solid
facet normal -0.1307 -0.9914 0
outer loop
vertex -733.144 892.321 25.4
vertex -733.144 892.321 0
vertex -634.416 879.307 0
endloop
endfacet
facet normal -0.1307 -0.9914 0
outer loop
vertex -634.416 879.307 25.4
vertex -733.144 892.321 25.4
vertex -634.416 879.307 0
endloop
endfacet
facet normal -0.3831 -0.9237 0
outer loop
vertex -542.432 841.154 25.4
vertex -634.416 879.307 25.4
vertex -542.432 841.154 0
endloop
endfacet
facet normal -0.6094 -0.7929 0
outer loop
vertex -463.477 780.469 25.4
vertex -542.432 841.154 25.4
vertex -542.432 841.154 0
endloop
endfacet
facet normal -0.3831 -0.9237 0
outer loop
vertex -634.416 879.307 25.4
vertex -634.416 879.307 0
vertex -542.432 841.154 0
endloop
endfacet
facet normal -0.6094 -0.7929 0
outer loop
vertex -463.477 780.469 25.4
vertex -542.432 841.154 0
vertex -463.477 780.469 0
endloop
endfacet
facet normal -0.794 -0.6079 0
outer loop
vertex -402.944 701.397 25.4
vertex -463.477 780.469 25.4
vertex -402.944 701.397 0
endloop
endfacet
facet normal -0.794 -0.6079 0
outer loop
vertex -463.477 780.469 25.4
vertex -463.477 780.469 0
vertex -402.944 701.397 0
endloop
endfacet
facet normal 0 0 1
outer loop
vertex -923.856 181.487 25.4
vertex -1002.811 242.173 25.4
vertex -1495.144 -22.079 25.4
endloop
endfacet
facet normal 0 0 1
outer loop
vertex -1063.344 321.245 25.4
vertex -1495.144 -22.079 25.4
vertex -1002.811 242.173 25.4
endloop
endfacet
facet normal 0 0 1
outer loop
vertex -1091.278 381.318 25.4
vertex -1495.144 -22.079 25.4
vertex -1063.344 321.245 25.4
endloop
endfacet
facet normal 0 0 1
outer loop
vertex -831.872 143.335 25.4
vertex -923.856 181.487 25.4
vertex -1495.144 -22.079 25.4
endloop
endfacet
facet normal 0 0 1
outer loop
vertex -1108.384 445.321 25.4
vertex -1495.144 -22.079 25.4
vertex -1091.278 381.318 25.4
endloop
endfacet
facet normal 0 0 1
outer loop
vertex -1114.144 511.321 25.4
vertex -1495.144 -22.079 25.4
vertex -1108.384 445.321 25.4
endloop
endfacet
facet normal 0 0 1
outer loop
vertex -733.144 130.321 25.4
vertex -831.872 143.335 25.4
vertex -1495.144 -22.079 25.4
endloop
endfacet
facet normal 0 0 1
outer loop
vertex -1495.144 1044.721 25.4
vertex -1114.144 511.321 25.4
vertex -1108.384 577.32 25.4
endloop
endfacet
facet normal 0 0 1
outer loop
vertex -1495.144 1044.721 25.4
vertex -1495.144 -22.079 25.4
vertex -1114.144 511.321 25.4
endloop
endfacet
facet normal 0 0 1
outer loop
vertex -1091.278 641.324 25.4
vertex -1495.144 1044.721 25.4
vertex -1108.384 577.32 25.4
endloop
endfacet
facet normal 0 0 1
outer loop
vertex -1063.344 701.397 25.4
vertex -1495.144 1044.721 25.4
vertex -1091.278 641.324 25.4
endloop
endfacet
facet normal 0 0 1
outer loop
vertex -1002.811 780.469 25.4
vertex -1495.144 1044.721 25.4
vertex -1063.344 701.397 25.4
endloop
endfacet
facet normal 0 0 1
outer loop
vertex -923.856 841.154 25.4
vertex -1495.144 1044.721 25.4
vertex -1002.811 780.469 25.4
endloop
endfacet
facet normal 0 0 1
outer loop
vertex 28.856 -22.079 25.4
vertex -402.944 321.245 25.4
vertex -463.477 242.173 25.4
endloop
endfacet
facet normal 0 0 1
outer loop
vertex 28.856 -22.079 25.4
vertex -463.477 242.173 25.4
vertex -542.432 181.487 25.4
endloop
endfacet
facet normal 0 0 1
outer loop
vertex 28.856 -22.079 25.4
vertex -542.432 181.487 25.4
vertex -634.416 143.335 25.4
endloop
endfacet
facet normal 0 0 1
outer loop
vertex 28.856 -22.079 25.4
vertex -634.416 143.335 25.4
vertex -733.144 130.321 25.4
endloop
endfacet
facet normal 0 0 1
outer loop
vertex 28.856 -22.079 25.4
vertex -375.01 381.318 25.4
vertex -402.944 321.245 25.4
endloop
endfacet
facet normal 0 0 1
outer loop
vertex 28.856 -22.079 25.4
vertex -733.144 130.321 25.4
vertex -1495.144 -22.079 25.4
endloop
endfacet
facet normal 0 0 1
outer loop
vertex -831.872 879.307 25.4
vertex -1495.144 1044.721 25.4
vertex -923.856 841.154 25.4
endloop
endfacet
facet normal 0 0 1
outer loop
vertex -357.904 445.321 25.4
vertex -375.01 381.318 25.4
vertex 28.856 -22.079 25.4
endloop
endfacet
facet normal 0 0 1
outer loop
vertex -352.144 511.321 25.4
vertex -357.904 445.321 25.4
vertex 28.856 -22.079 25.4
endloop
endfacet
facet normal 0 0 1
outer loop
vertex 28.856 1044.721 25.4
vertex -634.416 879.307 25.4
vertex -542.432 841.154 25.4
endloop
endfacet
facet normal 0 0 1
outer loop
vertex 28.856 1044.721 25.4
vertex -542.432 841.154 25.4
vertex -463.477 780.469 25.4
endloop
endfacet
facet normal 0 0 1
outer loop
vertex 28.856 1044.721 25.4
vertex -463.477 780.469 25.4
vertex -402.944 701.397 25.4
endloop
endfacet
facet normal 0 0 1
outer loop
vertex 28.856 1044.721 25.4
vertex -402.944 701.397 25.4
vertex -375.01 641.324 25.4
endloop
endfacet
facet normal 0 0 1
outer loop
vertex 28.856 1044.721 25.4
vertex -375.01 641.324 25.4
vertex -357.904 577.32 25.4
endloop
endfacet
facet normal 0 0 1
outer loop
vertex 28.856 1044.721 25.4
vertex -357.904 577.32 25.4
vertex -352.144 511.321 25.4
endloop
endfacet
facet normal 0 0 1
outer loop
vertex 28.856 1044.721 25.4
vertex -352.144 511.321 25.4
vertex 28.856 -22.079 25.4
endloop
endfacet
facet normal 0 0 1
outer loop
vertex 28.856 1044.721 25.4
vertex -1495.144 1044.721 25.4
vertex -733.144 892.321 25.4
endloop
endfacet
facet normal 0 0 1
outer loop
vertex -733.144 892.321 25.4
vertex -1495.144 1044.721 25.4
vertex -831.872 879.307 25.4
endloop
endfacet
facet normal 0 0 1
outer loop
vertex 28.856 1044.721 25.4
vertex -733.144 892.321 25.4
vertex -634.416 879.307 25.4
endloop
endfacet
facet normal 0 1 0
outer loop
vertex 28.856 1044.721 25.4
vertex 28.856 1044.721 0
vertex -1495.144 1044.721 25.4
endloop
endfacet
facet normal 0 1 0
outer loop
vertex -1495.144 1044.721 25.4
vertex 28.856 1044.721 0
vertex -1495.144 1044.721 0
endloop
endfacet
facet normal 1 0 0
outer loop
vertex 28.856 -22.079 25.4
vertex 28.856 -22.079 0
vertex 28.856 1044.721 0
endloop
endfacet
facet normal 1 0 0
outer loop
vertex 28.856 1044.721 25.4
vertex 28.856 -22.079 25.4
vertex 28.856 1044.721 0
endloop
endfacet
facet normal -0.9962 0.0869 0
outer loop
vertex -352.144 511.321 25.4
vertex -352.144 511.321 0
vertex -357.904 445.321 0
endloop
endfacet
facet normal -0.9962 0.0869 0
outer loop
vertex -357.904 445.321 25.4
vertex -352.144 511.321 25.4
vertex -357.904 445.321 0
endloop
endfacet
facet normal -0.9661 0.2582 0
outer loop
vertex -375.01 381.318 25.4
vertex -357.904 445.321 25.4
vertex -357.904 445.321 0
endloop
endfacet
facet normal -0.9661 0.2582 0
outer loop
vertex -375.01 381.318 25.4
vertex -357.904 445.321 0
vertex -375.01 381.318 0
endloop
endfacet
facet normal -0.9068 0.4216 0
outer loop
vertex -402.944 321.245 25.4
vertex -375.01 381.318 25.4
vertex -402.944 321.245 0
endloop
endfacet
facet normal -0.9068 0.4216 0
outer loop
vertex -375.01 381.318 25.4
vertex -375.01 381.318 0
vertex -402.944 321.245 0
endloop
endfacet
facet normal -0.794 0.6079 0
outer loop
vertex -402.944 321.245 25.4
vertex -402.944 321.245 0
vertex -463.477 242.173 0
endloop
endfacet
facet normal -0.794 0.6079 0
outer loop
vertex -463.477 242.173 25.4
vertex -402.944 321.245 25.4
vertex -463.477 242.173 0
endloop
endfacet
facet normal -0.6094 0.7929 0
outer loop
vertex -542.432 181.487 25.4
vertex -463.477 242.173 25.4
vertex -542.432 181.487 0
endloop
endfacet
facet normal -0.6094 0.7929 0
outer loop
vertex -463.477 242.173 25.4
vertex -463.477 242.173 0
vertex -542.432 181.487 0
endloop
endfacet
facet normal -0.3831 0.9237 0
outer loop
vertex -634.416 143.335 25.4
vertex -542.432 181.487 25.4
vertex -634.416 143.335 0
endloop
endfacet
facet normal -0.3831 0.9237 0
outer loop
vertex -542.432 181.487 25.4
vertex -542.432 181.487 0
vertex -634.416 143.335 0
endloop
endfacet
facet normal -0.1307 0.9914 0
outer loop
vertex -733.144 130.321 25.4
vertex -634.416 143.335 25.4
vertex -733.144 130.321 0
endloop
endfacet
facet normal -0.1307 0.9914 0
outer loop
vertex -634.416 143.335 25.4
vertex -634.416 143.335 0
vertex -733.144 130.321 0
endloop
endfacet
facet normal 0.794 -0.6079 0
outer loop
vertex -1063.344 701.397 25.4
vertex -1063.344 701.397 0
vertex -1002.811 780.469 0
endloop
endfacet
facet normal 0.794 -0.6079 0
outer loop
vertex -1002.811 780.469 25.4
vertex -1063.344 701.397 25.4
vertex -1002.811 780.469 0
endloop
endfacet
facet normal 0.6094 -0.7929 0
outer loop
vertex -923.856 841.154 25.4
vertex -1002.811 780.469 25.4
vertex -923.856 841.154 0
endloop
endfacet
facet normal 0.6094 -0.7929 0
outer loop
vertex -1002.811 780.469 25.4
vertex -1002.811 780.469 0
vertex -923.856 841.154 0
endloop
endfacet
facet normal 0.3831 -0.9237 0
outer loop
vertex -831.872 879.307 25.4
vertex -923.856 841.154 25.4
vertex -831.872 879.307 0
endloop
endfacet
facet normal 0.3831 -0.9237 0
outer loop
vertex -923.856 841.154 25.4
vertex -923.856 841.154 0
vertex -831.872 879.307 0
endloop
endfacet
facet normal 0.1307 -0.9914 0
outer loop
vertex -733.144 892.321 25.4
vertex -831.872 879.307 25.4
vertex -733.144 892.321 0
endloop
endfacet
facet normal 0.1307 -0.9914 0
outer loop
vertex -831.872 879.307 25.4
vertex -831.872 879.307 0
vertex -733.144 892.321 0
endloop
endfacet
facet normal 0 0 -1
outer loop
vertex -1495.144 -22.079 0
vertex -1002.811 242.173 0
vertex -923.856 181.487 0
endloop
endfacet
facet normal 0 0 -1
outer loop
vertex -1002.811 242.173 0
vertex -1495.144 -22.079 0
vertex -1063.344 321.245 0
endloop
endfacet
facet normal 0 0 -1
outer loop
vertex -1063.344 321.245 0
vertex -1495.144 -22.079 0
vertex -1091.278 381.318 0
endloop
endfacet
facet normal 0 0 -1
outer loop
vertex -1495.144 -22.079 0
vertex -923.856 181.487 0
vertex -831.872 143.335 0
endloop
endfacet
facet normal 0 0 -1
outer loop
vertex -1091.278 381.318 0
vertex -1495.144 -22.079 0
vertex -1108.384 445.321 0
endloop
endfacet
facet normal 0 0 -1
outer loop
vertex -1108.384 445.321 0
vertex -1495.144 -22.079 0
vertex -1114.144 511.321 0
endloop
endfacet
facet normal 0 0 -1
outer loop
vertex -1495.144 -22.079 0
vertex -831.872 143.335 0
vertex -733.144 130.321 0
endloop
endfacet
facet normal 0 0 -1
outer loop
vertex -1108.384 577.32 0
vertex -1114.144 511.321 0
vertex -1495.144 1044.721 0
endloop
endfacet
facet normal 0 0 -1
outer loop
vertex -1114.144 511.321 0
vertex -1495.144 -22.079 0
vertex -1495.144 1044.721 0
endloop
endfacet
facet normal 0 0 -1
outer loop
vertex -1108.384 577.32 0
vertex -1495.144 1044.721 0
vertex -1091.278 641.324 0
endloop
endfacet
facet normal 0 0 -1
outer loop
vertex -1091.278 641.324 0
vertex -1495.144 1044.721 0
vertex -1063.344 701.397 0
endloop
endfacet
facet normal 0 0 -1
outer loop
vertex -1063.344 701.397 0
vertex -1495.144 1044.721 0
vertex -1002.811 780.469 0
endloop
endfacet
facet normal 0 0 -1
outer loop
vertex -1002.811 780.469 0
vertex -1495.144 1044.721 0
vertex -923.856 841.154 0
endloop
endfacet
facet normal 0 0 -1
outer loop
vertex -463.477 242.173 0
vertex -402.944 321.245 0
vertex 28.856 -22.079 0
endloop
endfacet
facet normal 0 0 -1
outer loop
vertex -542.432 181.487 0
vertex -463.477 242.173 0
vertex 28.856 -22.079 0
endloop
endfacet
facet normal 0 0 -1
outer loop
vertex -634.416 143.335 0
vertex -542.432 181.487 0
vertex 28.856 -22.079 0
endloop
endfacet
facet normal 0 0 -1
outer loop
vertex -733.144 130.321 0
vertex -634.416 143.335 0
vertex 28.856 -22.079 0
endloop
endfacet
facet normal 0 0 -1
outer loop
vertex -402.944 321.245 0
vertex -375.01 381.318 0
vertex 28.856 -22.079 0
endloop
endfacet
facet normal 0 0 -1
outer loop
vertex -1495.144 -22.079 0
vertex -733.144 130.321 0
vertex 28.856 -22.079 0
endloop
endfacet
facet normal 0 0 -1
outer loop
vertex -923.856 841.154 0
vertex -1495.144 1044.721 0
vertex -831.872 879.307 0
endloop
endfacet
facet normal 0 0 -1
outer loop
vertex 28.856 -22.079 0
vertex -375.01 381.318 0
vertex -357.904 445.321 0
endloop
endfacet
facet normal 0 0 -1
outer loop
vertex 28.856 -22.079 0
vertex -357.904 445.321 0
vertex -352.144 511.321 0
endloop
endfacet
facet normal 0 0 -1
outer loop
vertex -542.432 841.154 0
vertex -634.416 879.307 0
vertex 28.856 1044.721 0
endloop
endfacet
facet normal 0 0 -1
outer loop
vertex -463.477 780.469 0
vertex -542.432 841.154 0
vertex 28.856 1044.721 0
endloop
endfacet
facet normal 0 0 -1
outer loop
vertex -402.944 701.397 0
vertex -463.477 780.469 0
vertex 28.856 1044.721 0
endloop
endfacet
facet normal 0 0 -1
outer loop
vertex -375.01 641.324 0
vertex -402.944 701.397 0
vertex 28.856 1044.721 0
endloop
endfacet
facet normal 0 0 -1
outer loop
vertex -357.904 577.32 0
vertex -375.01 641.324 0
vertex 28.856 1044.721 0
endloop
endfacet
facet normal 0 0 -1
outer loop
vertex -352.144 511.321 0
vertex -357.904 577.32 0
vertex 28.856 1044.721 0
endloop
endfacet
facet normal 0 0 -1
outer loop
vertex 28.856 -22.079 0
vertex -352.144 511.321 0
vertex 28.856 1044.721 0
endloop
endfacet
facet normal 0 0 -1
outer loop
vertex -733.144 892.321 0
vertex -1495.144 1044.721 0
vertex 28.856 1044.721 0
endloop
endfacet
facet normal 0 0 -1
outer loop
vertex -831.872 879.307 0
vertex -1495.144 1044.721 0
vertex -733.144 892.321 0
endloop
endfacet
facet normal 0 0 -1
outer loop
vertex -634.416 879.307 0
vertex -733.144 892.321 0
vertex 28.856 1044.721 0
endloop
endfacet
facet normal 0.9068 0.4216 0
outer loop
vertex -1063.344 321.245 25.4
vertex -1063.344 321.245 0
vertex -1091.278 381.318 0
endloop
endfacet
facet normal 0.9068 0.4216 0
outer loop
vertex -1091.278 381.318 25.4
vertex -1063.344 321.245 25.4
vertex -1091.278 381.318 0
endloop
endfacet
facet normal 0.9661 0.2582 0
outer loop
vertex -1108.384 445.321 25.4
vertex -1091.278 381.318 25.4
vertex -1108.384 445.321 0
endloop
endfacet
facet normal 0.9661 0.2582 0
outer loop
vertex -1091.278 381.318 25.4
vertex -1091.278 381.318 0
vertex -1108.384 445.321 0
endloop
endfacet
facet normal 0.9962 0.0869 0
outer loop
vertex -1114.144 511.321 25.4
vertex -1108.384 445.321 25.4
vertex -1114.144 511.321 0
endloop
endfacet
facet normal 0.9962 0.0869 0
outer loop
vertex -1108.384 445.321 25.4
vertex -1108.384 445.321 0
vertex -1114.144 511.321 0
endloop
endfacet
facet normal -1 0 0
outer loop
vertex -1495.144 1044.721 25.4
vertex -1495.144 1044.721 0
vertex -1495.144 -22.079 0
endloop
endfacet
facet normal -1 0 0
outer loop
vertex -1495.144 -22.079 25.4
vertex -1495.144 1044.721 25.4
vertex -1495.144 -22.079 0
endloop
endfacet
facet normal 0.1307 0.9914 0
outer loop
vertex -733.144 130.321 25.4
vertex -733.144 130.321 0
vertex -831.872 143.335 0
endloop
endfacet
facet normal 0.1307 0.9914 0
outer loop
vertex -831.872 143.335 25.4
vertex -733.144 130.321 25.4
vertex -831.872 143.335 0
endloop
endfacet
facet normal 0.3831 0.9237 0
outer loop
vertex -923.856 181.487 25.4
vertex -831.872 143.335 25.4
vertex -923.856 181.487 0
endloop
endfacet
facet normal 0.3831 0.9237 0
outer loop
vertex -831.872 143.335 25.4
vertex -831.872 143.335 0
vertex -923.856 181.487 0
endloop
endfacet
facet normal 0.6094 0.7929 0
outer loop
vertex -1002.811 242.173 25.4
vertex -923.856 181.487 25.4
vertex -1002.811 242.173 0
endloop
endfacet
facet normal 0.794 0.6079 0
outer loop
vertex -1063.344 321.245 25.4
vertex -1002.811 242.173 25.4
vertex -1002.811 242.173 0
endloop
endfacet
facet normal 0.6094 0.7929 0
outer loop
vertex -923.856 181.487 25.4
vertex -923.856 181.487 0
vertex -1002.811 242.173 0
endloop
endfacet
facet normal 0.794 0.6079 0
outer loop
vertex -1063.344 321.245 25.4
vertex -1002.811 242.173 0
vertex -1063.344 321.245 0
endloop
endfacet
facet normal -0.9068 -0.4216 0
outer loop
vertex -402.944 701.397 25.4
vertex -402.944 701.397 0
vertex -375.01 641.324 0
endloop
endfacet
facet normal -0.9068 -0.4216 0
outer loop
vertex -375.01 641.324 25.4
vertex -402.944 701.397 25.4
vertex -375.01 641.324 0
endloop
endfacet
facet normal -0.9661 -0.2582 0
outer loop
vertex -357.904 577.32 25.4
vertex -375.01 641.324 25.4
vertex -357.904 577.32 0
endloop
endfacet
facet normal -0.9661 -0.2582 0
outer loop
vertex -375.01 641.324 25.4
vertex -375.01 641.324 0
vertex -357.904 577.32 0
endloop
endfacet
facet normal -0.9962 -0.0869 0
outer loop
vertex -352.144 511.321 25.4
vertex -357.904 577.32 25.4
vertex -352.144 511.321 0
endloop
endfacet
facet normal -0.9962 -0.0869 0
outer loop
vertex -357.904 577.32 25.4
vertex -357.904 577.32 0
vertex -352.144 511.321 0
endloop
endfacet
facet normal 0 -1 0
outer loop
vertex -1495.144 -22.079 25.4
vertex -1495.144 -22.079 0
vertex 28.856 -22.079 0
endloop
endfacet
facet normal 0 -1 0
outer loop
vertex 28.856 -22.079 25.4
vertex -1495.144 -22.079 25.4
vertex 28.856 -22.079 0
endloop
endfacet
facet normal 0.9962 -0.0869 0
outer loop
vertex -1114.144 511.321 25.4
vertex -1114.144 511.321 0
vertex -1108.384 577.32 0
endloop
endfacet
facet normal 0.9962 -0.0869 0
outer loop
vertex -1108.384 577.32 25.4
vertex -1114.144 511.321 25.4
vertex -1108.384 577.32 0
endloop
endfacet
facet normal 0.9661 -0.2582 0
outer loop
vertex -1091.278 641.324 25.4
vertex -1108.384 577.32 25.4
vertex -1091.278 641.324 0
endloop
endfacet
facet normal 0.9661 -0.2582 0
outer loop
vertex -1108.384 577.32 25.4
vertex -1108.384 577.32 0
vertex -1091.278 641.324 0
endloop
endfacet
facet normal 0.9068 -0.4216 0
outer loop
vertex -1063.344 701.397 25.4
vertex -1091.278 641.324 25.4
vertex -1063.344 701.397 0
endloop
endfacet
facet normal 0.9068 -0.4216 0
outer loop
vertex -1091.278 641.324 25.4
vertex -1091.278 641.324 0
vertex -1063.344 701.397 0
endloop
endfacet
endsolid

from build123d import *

# Parameters (mm, degrees)
F1_DEPTH = 25.4


with BuildPart() as f1:
    # F0 (on Top) → F1 (new body)
    with BuildSketch(Plane.XY):
        with BuildLine():
            Line((-1063.343933, 1044.720739), (-1495.143933, 1044.720739))
            Line((-1495.143933, 1044.720739), (-1495.143933, 511.320739))
            Line((-1495.143933, 511.320739), (-1114.143933, 511.320739))
            ThreePointArc((-1114.143933, 511.320739), (-1101.224902, 609.694516), (-1063.343933, 701.396934))
            Line((-1063.343933, 701.396934), (-1063.343933, 1044.720739))
        make_face()
        with BuildLine():
            Line((-733.143933, 1044.720739), (-1063.343933, 1044.720739))
            Line((-1063.343933, 1044.720739), (-1063.343933, 701.396934))
            ThreePointArc((-1063.343933, 701.396934), (-923.855718, 841.154053), (-733.143933, 892.320739))
            Line((-733.143933, 892.320739), (-733.143933, 1044.720739))
        make_face()
        with BuildLine():
            Line((-1114.143933, 511.320739), (-1495.143933, 511.320739))
            Line((-1495.143933, 511.320739), (-1495.143933, -22.079261))
            Line((-1495.143933, -22.079261), (-1063.343933, -22.079261))
            Line((-1063.343933, -22.079261), (-1063.343933, 321.244544))
            ThreePointArc((-1063.343933, 321.244544), (-1101.224902, 412.946962), (-1114.143933, 511.320739))
        make_face()
        with BuildLine():
            Line((-402.943933, 1044.720739), (-733.143933, 1044.720739))
            Line((-733.143933, 1044.720739), (-733.143933, 892.320739))
            ThreePointArc((-733.143933, 892.320739), (-542.432148, 841.154053), (-402.943933, 701.396934))
            Line((-402.943933, 701.396934), (-402.943933, 1044.720739))
        make_face()
        with BuildLine():
            Line((28.856067, 1044.720739), (-402.943933, 1044.720739))
            Line((-402.943933, 1044.720739), (-402.943933, 701.396934))
            ThreePointArc((-402.943933, 701.396934), (-365.062964, 609.694516), (-352.143933, 511.320739))
            Line((-352.143933, 511.320739), (28.856067, 511.320739))
            Line((28.856067, 511.320739), (28.856067, 1044.720739))
        make_face()
        with BuildLine():
            Line((-1063.343933, 321.244544), (-1063.343933, -22.079261))
            Line((-1063.343933, -22.079261), (-733.143933, -22.079261))
            Line((-733.143933, -22.079261), (-733.143933, 130.320739))
            ThreePointArc((-733.143933, 130.320739), (-923.855718, 181.487425), (-1063.343933, 321.244544))
        make_face()
        with BuildLine():
            Line((-733.143933, 130.320739), (-733.143933, -22.079261))
            Line((-733.143933, -22.079261), (-402.943933, -22.079261))
            Line((-402.943933, -22.079261), (-402.943933, 321.244544))
            ThreePointArc((-402.943933, 321.244544), (-542.432148, 181.487425), (-733.143933, 130.320739))
        make_face()
        with BuildLine():
            Line((28.856067, -22.079261), (28.856067, 511.320739))
            Line((28.856067, 511.320739), (-352.143933, 511.320739))
            ThreePointArc((-352.143933, 511.320739), (-365.062964, 412.946962), (-402.943933, 321.244544))
            Line((-402.943933, 321.244544), (-402.943933, -22.079261))
            Line((-402.943933, -22.079261), (28.856067, -22.079261))
        make_face()
    extrude(amount=F1_DEPTH)


solid = f1.part
